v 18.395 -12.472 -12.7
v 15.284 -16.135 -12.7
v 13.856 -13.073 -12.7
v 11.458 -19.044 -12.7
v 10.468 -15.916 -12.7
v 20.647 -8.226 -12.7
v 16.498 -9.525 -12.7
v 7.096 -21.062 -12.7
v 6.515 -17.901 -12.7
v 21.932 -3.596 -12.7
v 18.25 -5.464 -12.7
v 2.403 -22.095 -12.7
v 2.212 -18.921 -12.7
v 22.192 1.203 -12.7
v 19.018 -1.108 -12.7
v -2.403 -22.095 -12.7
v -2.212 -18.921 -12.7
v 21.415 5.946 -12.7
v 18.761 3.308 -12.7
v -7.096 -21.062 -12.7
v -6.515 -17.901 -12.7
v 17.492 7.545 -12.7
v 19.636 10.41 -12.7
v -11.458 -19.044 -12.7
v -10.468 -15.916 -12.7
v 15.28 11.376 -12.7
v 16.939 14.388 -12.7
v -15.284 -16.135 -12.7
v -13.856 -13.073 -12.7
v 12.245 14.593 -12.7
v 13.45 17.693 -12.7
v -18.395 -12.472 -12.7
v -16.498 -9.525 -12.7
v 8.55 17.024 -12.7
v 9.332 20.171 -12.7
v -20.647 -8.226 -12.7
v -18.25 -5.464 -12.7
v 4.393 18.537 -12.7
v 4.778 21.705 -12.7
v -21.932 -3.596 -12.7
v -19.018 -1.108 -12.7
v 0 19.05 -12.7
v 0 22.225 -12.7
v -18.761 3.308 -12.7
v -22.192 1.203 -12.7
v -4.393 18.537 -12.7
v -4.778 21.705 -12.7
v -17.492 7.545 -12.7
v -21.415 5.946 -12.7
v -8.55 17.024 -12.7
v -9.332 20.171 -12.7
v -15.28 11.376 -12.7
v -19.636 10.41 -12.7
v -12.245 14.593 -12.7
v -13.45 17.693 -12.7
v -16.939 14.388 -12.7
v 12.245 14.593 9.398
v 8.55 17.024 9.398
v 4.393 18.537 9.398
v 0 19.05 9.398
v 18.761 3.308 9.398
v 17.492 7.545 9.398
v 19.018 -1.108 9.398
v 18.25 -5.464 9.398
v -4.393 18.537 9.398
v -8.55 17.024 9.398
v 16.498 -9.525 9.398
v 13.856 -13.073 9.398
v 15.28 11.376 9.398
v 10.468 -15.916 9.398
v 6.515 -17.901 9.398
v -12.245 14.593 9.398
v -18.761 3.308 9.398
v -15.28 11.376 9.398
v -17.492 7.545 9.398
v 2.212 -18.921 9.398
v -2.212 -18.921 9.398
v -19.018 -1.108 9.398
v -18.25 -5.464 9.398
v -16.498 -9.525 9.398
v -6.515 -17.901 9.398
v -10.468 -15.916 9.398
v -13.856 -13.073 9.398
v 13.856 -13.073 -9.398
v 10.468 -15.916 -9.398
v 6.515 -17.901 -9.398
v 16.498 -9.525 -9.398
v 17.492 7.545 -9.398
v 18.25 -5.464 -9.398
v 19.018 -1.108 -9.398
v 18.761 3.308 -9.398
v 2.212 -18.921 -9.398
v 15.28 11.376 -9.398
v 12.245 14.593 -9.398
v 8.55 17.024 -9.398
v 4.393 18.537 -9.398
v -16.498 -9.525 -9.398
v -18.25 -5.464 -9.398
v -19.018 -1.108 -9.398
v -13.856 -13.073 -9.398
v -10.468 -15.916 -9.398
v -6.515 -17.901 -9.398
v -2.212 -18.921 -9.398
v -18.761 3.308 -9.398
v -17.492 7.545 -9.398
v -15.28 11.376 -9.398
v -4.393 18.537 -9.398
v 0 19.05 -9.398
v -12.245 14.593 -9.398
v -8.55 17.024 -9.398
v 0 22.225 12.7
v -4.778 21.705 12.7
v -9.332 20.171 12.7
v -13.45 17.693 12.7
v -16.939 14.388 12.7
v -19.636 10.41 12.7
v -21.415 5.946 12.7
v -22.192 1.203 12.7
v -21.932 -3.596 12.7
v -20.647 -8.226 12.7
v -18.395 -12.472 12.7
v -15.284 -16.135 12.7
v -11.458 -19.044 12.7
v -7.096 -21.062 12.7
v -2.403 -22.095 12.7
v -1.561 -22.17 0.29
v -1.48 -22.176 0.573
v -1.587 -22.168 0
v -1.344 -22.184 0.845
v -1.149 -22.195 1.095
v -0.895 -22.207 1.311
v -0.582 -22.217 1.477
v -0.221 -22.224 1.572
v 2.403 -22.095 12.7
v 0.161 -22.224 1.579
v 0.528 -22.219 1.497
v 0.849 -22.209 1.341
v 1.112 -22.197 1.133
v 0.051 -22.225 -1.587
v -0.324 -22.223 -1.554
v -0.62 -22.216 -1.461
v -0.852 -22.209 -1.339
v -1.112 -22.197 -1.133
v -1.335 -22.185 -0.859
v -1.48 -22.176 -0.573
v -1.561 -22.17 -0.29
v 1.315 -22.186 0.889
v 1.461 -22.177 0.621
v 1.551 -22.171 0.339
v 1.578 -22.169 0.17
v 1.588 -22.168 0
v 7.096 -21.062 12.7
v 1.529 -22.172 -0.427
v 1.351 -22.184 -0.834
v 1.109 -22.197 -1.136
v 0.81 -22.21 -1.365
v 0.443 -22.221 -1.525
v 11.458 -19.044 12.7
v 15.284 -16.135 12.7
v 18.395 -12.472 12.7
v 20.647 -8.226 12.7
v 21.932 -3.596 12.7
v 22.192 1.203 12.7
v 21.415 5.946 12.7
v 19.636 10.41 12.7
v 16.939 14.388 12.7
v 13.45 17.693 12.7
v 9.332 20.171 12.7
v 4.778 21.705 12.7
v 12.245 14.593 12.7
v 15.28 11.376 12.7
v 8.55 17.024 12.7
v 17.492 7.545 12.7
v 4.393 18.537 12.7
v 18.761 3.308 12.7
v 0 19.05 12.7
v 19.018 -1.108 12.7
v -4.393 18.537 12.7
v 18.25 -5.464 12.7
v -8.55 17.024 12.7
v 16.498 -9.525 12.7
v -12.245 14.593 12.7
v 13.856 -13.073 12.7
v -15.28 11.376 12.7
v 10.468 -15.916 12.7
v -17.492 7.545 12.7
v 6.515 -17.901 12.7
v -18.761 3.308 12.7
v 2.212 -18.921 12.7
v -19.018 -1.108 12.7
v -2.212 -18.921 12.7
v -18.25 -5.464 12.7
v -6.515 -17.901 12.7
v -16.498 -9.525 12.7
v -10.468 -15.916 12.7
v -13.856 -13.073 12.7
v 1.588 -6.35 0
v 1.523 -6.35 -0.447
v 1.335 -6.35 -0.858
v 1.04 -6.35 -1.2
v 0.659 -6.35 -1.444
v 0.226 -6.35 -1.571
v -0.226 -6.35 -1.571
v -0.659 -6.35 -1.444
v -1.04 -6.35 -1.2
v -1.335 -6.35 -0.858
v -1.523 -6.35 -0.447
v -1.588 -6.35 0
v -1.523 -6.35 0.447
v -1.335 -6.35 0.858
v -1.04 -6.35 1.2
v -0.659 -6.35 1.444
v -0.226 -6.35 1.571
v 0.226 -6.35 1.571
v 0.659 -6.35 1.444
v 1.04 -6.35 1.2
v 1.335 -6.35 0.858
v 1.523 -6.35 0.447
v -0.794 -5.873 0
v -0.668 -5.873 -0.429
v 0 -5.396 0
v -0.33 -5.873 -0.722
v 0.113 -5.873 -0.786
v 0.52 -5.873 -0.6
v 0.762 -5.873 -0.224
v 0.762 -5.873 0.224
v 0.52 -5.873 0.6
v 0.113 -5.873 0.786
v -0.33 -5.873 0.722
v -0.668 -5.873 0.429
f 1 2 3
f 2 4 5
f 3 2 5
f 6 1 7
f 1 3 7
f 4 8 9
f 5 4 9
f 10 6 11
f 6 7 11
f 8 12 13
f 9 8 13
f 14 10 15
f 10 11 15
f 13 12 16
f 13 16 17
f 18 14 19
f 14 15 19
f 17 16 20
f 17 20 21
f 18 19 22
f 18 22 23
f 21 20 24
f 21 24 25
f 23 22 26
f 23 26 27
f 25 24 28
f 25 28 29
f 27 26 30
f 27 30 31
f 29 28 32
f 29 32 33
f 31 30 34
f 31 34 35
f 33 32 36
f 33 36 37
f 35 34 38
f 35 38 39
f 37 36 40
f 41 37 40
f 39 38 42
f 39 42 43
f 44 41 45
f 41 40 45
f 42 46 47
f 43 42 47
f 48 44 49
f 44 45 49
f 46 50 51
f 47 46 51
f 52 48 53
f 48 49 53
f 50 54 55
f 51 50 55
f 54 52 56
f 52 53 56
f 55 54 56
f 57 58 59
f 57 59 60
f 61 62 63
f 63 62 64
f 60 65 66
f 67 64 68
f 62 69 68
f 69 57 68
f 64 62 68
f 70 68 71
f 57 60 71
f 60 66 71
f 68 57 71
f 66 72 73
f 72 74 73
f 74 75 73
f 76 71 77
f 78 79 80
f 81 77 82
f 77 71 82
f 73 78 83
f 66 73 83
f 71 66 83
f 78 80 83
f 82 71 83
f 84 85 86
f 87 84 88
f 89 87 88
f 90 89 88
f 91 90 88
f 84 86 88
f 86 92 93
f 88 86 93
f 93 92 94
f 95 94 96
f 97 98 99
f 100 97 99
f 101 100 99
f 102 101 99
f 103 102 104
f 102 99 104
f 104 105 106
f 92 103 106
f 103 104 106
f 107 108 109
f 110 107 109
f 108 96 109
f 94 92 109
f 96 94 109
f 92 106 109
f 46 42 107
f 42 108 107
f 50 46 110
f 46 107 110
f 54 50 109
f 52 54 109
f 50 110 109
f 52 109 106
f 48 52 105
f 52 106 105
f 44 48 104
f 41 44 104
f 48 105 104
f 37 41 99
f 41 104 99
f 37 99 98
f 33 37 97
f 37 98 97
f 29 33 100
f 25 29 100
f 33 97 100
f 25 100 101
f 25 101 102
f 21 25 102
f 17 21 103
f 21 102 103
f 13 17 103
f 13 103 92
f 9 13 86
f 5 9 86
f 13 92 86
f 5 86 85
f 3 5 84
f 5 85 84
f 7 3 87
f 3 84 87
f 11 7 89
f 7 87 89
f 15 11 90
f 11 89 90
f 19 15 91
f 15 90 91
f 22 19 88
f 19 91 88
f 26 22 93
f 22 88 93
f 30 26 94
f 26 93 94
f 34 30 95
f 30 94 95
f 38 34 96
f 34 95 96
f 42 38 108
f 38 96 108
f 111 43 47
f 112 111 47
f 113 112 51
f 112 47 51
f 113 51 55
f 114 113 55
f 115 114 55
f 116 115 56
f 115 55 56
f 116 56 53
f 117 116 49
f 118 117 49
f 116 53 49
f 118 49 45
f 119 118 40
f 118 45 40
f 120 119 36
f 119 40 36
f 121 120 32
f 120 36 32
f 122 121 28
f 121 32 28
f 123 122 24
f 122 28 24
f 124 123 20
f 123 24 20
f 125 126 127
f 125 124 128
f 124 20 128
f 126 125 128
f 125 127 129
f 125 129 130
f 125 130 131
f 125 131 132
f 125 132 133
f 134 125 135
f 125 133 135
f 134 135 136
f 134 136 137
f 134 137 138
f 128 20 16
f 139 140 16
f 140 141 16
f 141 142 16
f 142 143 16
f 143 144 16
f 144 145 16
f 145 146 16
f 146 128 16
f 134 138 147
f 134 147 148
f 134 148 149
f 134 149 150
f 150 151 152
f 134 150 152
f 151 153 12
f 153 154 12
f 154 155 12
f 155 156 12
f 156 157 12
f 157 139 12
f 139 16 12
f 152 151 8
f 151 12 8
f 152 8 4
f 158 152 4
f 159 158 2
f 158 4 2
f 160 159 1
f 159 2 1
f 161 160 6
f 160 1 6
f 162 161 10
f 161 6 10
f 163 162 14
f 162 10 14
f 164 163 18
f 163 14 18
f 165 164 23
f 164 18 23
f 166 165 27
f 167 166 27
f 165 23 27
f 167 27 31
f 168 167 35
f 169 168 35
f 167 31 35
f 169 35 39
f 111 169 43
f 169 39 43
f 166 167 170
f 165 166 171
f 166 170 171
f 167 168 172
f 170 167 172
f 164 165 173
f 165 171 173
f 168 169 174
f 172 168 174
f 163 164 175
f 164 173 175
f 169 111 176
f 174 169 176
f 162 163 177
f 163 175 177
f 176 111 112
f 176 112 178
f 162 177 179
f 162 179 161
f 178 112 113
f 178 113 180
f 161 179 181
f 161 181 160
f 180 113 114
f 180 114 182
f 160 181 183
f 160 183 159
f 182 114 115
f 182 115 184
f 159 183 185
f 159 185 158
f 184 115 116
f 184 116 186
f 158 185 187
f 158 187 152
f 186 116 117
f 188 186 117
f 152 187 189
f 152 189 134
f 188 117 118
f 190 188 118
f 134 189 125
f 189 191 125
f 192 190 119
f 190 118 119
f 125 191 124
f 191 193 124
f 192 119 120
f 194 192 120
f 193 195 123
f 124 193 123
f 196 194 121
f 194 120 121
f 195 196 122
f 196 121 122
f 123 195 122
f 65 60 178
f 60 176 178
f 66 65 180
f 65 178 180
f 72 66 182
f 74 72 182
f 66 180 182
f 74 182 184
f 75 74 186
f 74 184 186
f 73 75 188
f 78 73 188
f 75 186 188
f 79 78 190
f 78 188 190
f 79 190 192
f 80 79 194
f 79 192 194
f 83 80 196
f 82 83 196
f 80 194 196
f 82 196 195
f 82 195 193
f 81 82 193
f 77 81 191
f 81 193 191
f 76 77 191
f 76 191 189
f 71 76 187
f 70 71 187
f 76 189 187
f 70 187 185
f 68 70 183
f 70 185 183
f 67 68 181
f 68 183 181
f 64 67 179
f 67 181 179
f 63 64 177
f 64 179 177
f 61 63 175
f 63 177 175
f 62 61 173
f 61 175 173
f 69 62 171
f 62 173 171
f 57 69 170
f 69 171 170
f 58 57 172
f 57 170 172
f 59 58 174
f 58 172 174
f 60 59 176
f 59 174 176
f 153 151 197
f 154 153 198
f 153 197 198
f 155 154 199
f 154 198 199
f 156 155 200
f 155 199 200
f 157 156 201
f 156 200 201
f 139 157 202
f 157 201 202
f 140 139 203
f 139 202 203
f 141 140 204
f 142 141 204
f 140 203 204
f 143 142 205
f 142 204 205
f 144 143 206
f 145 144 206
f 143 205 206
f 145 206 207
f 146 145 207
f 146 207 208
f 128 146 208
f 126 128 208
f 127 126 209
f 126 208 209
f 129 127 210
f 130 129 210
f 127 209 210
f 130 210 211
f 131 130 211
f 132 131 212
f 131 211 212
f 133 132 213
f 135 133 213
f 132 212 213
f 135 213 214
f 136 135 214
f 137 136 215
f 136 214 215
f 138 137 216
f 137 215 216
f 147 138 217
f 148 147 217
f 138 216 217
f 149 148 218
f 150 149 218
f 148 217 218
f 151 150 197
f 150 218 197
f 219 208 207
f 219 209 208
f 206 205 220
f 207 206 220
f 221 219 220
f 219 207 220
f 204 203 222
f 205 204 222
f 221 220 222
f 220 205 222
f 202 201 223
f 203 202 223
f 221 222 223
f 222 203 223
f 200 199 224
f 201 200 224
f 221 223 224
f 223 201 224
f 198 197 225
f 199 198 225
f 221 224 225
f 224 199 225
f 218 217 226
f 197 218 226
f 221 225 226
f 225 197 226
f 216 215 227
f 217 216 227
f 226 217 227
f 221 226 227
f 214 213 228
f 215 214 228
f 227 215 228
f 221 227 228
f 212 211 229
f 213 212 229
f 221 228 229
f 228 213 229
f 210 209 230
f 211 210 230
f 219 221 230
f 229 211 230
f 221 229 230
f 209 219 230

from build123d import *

# Parameters (mm, degrees)
F_1_8_0_125_DIAMETER_HOLE1_D     = 3.175
F_1_8_0_125_DIAMETER_HOLE1_DEPTH = 15.875
F_1_8_0_125_DIAMETER_HOLE1_TIP   = 0.953866233


with BuildPart() as part:
    # Sketch1 → Revolve1 (revolve)
    with BuildSketch(Plane(origin=(0, 0, 0), x_dir=(0, 0, -1), z_dir=(1, 0, 0))):
        Polygon((0, 0), (-9.398, 0), (-9.398, 19.05), (-12.7, 19.05), (-12.7, 22.225), (12.7, 22.225), (12.7, 19.05), (9.398, 19.05), (9.398, 0), align=None)
    revolve(axis=Axis((0, 0, 0), (0, 0, 1)))

    # 1/8 (0.125) Diameter Hole1
    with Locations(Plane(origin=(0, -22.225, 0), x_dir=(-1, 0, 0), z_dir=(0, -1, 0))):
        with Locations((0, 0)):
            Hole(F_1_8_0_125_DIAMETER_HOLE1_D / 2, depth=F_1_8_0_125_DIAMETER_HOLE1_DEPTH)
            with Locations((0, 0, -(F_1_8_0_125_DIAMETER_HOLE1_DEPTH + F_1_8_0_125_DIAMETER_HOLE1_TIP / 2))):  # 118° drill point
                Cone(0, F_1_8_0_125_DIAMETER_HOLE1_D / 2, F_1_8_0_125_DIAMETER_HOLE1_TIP, mode=Mode.SUBTRACT)


solid = part.part
